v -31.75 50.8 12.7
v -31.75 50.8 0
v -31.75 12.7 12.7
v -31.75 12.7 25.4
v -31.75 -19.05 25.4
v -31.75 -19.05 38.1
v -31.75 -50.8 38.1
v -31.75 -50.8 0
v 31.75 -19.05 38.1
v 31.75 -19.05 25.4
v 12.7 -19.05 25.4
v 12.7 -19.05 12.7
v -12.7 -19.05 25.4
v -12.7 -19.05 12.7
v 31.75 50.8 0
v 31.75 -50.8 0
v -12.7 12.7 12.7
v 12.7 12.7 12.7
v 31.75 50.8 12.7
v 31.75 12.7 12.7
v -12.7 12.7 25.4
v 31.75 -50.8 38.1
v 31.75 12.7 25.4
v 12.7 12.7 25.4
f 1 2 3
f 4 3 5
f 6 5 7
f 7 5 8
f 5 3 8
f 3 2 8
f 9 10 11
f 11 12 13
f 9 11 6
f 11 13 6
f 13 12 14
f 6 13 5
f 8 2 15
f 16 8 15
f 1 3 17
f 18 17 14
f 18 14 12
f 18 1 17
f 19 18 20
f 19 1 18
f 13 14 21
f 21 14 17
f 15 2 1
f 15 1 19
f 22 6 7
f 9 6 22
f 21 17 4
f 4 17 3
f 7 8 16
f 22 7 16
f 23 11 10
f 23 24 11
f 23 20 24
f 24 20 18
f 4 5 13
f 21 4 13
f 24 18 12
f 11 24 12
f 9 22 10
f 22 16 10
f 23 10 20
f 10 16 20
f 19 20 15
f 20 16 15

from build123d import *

# Parameters (mm, degrees)
F0_W     = 63.5
F0_H     = 101.6
F1_DEPTH = 12.7
F2_W     = 25.4
F2_H     = 31.75
F3_DEPTH = 12.7
F5_DEPTH = 12.7


with BuildPart() as f1:
    # F0 (on Top) → F1 (new body)
    with BuildSketch(Plane.XY):
        Rectangle(F0_W, F0_H)
    extrude(amount=F1_DEPTH)

    # F2 (on face) → F3 (join)
    with BuildSketch(Plane.XY.offset(12.7)):
        Polygon((31.75, -50.8), (31.75, 12.7), (12.7, 12.7), (12.7, -19.05), (12.7, -50.8), align=None)
        Polygon((-12.7, -50.8), (-12.7, -19.05), (-12.7, 12.7), (-31.75, 12.7), (-31.75, -50.8), align=None)
        with Locations((0, -34.925)):
            Rectangle(F2_W, F2_H)
    extrude(amount=F3_DEPTH)

    # F4 (on face) → F5 (join)
    with BuildSketch(Plane.XY.offset(25.4)):
        Polygon((-31.75, -50.8), (31.75, -50.8), (31.75, -19.05), (12.7, -19.05), (-12.7, -19.05), (-31.75, -19.05), align=None)
    extrude(amount=F5_DEPTH)


solid = f1.part
